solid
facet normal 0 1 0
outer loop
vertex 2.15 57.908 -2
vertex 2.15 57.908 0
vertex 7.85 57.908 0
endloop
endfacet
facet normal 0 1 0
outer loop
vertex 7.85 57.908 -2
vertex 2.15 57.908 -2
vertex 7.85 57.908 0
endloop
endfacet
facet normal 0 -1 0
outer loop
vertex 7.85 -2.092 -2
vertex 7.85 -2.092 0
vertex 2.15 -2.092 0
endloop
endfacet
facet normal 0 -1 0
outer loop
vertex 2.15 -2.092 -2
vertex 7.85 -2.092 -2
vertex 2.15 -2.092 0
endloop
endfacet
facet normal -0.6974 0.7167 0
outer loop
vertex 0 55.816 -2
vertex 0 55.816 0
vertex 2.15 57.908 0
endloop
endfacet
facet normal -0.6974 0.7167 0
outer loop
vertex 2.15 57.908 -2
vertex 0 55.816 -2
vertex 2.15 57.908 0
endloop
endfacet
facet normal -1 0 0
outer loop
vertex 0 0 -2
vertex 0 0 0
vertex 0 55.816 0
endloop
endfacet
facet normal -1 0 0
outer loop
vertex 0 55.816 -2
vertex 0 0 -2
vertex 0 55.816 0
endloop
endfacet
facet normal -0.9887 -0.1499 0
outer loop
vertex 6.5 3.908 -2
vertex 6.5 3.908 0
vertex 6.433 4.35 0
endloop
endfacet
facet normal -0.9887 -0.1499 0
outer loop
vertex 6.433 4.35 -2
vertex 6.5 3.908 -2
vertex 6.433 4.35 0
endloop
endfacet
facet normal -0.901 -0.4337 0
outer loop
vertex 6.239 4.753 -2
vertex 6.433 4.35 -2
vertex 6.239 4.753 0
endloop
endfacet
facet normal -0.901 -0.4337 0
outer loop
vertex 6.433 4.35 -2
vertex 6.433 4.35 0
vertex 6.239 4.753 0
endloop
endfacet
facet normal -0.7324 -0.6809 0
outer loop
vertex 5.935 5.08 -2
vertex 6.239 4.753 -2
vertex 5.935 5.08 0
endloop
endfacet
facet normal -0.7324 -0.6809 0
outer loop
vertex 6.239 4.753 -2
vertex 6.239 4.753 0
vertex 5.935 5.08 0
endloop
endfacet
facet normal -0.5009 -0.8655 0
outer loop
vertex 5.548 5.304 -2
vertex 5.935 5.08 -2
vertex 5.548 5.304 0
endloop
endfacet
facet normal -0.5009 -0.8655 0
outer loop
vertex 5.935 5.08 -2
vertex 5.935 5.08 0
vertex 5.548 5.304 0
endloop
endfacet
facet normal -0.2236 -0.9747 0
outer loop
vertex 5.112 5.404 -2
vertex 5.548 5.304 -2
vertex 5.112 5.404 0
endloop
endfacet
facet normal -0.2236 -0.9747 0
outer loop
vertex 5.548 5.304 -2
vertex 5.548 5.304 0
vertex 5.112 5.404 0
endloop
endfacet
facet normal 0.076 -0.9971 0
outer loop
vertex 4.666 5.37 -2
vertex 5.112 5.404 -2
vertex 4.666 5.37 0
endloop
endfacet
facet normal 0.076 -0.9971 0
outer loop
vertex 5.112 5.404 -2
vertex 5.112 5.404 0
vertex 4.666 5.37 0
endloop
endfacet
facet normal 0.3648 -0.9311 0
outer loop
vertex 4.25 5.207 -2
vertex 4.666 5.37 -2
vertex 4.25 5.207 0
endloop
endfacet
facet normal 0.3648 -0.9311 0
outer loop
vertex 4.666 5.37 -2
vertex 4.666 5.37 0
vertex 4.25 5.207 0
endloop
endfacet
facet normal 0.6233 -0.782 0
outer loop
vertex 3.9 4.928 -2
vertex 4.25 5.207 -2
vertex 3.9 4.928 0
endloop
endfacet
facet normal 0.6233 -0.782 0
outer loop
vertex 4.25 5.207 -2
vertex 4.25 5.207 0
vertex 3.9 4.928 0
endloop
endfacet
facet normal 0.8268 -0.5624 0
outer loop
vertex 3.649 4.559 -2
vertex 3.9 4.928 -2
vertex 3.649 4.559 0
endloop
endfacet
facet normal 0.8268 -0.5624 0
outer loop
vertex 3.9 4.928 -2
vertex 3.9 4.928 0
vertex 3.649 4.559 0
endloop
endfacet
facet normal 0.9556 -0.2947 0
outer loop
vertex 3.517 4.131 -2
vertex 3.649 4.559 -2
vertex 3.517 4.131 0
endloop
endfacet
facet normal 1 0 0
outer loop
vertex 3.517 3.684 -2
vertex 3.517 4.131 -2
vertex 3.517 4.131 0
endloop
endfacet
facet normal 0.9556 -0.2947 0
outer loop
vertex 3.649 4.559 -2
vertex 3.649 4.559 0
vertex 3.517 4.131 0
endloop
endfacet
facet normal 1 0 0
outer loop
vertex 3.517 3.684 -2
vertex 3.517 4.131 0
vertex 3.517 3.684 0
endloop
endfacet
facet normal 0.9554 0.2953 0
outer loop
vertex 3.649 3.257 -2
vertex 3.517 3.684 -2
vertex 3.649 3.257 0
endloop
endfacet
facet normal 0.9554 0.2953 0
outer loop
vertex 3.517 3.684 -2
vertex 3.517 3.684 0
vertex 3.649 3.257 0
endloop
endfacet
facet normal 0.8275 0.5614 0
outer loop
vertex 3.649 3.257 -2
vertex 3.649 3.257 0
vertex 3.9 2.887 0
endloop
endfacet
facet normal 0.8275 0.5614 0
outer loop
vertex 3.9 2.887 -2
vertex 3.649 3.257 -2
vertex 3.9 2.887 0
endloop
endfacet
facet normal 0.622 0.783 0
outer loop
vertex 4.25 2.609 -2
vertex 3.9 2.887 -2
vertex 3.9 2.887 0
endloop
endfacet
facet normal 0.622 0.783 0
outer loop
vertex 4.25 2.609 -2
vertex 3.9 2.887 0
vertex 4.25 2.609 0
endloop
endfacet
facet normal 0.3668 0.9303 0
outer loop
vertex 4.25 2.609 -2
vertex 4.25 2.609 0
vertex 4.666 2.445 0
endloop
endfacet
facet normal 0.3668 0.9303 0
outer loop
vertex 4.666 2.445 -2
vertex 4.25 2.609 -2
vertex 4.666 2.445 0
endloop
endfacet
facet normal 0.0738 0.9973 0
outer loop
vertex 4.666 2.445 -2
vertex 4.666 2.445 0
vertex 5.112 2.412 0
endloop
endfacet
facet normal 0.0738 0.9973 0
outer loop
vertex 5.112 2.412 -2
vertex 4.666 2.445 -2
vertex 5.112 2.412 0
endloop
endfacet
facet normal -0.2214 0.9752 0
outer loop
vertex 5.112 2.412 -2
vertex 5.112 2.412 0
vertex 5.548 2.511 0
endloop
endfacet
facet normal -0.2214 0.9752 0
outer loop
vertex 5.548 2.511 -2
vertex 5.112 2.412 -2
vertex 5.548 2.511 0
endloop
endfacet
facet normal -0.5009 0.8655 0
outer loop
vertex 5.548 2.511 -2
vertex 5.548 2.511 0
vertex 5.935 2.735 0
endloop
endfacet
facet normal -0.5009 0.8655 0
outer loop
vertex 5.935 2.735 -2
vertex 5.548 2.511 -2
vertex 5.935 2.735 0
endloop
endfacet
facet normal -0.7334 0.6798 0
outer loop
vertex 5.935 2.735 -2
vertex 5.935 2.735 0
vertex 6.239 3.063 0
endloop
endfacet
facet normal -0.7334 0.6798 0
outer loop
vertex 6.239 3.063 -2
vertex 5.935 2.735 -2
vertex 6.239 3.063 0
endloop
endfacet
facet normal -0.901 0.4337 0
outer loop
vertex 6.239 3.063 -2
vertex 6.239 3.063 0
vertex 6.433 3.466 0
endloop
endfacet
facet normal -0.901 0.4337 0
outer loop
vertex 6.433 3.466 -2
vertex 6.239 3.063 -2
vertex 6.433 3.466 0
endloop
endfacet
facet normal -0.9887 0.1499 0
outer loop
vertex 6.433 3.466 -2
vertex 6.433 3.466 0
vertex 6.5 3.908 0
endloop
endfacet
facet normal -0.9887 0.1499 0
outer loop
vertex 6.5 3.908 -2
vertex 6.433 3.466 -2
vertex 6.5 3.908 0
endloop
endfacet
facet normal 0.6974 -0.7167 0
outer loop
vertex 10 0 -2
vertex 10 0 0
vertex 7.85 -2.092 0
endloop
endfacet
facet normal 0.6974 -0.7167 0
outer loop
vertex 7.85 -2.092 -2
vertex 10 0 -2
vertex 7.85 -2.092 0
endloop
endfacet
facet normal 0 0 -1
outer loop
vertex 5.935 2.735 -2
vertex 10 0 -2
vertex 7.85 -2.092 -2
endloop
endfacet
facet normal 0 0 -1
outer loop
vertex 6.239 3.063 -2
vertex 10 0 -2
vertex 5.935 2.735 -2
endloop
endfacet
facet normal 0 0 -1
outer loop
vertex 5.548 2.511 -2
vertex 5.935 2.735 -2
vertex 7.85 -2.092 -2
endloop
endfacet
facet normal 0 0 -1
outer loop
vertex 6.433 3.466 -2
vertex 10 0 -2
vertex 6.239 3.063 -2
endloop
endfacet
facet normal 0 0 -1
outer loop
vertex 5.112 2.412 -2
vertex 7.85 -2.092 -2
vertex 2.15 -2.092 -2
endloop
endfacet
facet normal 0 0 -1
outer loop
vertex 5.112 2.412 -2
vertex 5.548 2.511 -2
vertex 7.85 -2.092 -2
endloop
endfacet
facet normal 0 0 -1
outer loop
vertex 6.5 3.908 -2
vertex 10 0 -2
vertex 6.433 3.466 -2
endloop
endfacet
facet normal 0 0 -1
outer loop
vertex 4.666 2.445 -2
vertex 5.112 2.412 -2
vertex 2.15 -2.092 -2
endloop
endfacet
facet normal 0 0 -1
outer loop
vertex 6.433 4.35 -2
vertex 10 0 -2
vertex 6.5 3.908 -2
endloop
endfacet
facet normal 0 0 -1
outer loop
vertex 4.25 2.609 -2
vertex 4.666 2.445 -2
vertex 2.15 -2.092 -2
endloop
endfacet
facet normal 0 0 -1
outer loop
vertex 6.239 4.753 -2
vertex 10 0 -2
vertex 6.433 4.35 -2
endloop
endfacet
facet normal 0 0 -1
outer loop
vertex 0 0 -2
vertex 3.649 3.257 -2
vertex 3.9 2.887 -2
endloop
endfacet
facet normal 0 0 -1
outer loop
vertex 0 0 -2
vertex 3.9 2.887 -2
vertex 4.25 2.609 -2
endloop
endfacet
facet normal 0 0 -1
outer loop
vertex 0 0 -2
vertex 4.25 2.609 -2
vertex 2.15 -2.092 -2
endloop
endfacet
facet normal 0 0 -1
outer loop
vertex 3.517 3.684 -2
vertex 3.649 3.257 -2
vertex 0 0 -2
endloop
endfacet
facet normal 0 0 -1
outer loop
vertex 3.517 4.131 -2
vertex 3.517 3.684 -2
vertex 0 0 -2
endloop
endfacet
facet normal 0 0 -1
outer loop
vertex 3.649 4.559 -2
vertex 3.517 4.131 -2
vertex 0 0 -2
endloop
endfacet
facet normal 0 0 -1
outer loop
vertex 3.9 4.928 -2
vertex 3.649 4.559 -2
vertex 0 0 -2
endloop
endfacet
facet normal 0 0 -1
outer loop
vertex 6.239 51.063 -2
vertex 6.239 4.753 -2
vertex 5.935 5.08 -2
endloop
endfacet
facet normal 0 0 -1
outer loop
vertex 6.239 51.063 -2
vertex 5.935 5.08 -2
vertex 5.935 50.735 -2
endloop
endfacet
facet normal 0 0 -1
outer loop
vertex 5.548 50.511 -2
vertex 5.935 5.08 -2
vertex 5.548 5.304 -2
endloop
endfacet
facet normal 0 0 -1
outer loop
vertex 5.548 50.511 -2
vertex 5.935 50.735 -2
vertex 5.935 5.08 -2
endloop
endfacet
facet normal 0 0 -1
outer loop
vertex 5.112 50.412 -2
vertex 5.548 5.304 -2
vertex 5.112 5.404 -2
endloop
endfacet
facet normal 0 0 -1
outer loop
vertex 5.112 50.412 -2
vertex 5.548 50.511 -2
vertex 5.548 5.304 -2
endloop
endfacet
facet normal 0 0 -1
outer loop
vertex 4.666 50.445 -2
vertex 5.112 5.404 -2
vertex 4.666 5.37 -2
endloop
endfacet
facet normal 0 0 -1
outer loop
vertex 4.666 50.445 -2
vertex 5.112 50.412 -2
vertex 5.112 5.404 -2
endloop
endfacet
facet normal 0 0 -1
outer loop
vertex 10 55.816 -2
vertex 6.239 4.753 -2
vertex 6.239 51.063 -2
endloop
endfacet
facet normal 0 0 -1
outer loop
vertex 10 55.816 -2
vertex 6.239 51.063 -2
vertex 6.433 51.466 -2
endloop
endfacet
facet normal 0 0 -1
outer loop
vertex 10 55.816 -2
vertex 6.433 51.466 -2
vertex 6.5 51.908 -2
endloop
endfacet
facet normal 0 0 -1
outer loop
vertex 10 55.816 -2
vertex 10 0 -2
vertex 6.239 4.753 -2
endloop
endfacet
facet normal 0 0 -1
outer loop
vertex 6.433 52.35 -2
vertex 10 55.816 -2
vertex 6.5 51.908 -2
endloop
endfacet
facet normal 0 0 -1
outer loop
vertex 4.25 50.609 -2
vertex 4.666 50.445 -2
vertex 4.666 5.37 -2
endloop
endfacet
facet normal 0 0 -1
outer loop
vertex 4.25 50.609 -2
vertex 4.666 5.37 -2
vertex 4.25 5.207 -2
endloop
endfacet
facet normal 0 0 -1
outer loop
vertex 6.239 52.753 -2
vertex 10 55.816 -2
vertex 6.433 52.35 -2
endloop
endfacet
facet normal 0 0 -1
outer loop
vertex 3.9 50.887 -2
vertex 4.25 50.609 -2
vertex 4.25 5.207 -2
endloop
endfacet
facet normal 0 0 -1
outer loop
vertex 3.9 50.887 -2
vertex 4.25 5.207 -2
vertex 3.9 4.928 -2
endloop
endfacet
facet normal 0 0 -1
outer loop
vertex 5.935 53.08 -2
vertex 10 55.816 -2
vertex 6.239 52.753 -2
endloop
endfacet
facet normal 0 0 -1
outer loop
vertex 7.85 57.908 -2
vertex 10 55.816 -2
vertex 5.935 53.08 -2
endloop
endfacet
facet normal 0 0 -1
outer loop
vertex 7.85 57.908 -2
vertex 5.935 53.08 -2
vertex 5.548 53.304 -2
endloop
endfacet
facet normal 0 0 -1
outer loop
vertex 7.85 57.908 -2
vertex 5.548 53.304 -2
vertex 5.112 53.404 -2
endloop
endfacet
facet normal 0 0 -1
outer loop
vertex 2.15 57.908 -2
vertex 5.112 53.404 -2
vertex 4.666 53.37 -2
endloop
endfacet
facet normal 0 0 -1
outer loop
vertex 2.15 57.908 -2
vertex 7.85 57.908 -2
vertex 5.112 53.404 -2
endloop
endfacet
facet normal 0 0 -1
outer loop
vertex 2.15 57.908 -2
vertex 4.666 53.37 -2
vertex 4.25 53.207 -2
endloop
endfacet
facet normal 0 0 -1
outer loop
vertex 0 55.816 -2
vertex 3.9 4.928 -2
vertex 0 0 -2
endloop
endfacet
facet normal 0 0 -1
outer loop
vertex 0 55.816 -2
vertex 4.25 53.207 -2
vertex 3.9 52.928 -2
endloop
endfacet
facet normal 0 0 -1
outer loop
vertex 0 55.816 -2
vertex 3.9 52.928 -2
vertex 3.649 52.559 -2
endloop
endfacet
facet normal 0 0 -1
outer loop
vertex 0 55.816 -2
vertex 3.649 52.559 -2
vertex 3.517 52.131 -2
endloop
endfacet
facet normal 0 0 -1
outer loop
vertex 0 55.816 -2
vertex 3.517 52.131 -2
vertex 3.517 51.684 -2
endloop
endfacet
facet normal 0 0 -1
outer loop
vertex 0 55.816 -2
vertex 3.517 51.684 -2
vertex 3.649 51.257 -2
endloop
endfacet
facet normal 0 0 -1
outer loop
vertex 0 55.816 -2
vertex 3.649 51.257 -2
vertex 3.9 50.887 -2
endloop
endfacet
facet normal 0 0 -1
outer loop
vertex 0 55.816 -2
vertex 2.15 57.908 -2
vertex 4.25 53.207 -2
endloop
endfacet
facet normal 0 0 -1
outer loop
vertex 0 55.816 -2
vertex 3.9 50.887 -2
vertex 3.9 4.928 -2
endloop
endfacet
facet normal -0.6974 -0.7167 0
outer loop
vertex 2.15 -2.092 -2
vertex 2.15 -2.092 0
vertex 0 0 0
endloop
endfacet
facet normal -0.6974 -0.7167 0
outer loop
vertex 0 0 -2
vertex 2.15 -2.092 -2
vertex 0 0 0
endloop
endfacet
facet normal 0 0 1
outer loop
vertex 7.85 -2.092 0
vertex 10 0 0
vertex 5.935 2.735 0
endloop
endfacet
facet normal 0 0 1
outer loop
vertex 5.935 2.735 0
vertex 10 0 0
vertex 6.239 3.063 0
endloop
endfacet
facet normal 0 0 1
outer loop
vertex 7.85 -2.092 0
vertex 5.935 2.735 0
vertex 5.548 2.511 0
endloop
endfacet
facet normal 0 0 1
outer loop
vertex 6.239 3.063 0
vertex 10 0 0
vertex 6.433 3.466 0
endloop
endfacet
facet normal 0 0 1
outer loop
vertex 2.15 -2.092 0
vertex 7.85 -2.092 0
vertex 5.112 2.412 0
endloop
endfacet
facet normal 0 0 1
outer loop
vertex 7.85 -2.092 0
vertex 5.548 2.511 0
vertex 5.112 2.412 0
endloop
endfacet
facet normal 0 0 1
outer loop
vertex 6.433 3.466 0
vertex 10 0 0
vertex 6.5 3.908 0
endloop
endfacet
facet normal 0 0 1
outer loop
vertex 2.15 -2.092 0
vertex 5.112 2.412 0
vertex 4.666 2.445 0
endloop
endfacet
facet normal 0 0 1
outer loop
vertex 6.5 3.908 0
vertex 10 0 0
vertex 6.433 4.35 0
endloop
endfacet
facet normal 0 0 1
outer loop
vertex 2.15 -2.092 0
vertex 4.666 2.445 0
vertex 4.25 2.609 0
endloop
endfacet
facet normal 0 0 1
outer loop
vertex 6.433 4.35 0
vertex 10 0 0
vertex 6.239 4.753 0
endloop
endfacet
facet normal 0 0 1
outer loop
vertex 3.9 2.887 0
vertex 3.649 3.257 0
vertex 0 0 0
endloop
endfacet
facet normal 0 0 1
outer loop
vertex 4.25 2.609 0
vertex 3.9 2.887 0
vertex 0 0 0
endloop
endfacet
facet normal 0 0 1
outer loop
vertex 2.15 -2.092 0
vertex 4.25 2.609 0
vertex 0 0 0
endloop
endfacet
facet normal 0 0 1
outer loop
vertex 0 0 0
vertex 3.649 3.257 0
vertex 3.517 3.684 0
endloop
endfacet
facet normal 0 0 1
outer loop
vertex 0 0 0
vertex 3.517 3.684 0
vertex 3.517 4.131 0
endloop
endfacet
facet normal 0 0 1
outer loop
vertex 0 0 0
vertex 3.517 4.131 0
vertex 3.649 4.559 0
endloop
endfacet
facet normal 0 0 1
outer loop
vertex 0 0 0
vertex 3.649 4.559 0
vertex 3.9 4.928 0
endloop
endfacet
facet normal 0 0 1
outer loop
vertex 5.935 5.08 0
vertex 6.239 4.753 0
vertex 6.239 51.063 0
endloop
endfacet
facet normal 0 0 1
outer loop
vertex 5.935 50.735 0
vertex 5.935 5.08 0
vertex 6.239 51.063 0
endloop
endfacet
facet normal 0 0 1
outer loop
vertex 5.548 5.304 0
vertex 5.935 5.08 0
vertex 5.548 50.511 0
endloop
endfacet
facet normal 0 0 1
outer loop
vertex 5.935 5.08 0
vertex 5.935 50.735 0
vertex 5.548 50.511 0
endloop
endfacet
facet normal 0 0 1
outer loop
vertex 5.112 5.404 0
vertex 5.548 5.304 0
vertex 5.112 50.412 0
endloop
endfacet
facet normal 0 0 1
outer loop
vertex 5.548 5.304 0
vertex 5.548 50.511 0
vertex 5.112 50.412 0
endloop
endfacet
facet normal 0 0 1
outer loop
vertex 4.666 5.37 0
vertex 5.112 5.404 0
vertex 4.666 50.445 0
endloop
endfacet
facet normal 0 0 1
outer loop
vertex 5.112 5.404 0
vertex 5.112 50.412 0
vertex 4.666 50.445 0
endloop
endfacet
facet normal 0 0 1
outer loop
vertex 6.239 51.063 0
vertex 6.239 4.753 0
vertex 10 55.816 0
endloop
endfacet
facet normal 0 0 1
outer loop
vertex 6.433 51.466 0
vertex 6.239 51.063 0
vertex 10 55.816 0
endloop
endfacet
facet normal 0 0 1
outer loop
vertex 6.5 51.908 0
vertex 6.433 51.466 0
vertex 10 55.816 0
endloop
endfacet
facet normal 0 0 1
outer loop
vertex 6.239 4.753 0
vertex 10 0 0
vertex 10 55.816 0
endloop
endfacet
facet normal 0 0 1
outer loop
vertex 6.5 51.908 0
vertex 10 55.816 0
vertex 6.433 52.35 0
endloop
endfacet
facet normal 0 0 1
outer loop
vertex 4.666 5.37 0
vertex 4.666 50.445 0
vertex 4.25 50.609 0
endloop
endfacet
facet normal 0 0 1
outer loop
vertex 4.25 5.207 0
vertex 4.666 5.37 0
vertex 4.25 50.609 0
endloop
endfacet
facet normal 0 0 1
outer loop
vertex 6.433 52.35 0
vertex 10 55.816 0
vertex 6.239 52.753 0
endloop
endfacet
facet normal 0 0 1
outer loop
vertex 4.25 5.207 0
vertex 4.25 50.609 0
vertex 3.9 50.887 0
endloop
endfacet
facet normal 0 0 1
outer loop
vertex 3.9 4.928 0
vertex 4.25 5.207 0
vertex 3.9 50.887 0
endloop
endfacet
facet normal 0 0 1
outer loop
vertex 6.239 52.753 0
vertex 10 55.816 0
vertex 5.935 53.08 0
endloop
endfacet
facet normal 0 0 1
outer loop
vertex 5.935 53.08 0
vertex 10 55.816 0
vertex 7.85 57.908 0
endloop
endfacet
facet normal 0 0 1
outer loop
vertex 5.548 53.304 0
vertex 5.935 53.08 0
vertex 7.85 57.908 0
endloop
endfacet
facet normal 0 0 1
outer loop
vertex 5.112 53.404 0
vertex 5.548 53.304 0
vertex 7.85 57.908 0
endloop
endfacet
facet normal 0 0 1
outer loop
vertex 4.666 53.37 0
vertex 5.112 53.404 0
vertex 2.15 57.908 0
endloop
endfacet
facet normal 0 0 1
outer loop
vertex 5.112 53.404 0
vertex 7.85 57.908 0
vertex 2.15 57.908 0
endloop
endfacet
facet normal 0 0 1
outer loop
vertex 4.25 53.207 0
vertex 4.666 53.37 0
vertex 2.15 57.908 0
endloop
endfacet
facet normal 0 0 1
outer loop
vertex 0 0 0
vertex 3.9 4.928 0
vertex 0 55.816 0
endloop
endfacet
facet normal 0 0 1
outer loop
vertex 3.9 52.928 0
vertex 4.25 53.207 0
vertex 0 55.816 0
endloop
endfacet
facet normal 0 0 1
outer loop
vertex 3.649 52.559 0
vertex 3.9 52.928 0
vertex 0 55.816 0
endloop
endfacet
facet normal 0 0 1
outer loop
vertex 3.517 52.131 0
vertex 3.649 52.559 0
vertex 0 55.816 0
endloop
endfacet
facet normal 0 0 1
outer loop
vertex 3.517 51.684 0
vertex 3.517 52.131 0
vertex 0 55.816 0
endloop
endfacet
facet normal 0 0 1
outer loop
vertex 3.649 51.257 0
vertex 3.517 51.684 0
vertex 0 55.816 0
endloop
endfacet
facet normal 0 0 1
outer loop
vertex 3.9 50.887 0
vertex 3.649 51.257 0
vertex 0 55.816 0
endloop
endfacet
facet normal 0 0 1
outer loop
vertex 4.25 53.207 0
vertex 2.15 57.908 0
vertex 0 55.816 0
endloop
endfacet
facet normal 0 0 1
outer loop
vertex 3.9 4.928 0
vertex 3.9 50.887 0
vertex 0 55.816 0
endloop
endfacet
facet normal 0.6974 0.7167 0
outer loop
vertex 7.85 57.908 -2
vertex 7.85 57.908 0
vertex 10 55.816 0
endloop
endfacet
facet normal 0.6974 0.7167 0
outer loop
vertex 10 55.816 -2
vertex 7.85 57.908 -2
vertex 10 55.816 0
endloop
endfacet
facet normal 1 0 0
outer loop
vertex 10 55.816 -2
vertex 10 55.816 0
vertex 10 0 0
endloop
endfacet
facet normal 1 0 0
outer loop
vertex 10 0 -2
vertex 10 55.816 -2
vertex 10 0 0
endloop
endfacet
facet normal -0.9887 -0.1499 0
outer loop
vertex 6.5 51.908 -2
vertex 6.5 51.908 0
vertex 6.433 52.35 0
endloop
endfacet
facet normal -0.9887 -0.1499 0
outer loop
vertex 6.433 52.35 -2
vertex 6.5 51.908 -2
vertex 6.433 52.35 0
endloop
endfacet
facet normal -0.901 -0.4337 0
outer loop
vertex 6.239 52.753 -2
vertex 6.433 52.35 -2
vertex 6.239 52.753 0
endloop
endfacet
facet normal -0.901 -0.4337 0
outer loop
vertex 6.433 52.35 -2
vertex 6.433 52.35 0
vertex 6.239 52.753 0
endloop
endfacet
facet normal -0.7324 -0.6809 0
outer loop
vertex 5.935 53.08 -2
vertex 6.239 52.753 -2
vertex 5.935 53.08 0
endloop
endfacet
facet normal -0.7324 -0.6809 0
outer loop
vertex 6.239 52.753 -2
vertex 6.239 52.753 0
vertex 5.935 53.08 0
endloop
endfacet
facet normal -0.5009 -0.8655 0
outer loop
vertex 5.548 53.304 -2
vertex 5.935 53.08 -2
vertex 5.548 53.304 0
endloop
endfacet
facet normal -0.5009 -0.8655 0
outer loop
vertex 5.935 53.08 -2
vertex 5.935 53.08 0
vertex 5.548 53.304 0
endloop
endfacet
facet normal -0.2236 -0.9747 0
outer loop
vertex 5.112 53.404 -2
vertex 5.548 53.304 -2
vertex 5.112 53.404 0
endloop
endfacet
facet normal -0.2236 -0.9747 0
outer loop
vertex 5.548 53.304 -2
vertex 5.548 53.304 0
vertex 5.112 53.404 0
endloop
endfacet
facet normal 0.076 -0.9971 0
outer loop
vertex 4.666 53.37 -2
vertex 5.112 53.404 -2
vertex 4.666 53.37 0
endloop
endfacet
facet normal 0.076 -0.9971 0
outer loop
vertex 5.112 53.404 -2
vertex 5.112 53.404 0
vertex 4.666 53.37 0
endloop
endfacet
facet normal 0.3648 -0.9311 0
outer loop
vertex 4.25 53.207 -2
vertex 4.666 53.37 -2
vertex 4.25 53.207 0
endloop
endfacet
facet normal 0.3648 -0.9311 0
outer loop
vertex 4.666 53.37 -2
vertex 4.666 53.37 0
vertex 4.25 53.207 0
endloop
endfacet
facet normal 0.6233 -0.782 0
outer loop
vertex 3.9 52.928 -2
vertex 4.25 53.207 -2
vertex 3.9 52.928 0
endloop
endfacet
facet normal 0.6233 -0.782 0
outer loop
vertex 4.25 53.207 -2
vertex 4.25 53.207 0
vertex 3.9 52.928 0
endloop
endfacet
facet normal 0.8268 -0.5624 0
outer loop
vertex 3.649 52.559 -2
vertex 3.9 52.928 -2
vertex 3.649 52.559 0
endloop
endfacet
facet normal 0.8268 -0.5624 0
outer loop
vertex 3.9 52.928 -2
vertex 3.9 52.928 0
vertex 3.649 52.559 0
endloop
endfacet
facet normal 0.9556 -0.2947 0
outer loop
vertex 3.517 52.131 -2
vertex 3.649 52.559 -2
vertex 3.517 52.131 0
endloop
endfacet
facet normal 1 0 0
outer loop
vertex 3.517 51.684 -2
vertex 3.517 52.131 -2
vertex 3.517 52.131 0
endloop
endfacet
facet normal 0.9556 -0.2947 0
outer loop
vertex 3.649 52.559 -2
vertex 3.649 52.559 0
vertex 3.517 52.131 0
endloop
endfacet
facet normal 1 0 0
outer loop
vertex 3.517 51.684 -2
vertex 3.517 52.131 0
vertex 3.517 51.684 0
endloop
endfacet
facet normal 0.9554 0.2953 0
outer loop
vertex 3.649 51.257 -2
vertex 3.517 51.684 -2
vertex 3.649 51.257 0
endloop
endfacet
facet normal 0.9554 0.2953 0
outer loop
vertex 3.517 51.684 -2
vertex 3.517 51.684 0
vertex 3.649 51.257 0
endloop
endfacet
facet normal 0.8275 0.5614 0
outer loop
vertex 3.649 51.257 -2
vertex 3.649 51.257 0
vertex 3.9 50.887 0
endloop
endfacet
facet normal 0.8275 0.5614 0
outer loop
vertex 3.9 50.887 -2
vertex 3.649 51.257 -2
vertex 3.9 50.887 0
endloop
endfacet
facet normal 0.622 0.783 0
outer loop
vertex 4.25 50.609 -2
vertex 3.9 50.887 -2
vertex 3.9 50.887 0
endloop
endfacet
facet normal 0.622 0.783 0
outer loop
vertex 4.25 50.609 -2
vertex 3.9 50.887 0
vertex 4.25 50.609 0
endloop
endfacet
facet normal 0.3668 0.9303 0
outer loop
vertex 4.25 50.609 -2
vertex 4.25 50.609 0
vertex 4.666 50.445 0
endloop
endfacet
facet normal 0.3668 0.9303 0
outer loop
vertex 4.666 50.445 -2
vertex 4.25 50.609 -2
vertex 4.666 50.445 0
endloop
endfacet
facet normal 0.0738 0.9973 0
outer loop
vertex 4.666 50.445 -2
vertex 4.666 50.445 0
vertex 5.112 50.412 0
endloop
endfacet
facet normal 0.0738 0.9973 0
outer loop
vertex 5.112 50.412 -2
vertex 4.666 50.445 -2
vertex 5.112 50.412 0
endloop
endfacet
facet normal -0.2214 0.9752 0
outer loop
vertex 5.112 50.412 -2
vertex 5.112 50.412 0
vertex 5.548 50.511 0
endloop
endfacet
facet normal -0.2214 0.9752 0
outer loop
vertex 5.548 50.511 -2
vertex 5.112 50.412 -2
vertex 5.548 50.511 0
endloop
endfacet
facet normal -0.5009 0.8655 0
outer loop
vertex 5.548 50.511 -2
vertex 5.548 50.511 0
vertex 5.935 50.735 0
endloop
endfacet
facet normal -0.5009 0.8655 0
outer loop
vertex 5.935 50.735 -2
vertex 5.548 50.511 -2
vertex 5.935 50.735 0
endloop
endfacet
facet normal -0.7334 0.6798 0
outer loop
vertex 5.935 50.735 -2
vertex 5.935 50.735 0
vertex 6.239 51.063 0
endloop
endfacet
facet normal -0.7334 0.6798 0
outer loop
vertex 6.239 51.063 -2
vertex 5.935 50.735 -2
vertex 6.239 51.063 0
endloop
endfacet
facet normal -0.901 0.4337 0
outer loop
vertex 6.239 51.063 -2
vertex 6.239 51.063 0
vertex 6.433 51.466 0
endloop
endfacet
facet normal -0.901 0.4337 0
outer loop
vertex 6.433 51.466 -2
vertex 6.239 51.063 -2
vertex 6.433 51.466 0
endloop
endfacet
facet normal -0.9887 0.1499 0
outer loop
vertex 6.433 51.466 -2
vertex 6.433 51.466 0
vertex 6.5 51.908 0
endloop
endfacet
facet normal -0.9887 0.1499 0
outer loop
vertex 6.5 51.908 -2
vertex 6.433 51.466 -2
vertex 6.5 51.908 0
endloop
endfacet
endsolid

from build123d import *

# Parameters (mm, degrees)
ESTRUSIONE_ESTRUSIONE1_DEPTH = 2
SCHIZZO2_R                   = 1.5
TAGLIO_ESTRUSIONE1_DEPTH     = 59.798875742


with BuildPart() as part:
    # Schizzo1 → Estrusione-Estrusione1 (new body)
    with BuildSketch(Plane.XY):
        Polygon((0, 55.815504809), (2.15, 57.907752405), (7.85, 57.907752405), (10, 55.815504809), (10, 0), (7.85, -2.092247595), (2.15, -2.092247595), (0, 0), align=None)
    extrude(amount=-ESTRUSIONE_ESTRUSIONE1_DEPTH)

    # Schizzo2 → Taglio-Estrusione1 (cut, through all)
    with BuildSketch(Plane.XY):
        with Locations((5, 51.907752405)):
            Circle(SCHIZZO2_R)
        with Locations((5, 3.907752405)):
            Circle(SCHIZZO2_R)
    extrude(amount=-TAGLIO_ESTRUSIONE1_DEPTH, mode=Mode.SUBTRACT)


solid = part.part
